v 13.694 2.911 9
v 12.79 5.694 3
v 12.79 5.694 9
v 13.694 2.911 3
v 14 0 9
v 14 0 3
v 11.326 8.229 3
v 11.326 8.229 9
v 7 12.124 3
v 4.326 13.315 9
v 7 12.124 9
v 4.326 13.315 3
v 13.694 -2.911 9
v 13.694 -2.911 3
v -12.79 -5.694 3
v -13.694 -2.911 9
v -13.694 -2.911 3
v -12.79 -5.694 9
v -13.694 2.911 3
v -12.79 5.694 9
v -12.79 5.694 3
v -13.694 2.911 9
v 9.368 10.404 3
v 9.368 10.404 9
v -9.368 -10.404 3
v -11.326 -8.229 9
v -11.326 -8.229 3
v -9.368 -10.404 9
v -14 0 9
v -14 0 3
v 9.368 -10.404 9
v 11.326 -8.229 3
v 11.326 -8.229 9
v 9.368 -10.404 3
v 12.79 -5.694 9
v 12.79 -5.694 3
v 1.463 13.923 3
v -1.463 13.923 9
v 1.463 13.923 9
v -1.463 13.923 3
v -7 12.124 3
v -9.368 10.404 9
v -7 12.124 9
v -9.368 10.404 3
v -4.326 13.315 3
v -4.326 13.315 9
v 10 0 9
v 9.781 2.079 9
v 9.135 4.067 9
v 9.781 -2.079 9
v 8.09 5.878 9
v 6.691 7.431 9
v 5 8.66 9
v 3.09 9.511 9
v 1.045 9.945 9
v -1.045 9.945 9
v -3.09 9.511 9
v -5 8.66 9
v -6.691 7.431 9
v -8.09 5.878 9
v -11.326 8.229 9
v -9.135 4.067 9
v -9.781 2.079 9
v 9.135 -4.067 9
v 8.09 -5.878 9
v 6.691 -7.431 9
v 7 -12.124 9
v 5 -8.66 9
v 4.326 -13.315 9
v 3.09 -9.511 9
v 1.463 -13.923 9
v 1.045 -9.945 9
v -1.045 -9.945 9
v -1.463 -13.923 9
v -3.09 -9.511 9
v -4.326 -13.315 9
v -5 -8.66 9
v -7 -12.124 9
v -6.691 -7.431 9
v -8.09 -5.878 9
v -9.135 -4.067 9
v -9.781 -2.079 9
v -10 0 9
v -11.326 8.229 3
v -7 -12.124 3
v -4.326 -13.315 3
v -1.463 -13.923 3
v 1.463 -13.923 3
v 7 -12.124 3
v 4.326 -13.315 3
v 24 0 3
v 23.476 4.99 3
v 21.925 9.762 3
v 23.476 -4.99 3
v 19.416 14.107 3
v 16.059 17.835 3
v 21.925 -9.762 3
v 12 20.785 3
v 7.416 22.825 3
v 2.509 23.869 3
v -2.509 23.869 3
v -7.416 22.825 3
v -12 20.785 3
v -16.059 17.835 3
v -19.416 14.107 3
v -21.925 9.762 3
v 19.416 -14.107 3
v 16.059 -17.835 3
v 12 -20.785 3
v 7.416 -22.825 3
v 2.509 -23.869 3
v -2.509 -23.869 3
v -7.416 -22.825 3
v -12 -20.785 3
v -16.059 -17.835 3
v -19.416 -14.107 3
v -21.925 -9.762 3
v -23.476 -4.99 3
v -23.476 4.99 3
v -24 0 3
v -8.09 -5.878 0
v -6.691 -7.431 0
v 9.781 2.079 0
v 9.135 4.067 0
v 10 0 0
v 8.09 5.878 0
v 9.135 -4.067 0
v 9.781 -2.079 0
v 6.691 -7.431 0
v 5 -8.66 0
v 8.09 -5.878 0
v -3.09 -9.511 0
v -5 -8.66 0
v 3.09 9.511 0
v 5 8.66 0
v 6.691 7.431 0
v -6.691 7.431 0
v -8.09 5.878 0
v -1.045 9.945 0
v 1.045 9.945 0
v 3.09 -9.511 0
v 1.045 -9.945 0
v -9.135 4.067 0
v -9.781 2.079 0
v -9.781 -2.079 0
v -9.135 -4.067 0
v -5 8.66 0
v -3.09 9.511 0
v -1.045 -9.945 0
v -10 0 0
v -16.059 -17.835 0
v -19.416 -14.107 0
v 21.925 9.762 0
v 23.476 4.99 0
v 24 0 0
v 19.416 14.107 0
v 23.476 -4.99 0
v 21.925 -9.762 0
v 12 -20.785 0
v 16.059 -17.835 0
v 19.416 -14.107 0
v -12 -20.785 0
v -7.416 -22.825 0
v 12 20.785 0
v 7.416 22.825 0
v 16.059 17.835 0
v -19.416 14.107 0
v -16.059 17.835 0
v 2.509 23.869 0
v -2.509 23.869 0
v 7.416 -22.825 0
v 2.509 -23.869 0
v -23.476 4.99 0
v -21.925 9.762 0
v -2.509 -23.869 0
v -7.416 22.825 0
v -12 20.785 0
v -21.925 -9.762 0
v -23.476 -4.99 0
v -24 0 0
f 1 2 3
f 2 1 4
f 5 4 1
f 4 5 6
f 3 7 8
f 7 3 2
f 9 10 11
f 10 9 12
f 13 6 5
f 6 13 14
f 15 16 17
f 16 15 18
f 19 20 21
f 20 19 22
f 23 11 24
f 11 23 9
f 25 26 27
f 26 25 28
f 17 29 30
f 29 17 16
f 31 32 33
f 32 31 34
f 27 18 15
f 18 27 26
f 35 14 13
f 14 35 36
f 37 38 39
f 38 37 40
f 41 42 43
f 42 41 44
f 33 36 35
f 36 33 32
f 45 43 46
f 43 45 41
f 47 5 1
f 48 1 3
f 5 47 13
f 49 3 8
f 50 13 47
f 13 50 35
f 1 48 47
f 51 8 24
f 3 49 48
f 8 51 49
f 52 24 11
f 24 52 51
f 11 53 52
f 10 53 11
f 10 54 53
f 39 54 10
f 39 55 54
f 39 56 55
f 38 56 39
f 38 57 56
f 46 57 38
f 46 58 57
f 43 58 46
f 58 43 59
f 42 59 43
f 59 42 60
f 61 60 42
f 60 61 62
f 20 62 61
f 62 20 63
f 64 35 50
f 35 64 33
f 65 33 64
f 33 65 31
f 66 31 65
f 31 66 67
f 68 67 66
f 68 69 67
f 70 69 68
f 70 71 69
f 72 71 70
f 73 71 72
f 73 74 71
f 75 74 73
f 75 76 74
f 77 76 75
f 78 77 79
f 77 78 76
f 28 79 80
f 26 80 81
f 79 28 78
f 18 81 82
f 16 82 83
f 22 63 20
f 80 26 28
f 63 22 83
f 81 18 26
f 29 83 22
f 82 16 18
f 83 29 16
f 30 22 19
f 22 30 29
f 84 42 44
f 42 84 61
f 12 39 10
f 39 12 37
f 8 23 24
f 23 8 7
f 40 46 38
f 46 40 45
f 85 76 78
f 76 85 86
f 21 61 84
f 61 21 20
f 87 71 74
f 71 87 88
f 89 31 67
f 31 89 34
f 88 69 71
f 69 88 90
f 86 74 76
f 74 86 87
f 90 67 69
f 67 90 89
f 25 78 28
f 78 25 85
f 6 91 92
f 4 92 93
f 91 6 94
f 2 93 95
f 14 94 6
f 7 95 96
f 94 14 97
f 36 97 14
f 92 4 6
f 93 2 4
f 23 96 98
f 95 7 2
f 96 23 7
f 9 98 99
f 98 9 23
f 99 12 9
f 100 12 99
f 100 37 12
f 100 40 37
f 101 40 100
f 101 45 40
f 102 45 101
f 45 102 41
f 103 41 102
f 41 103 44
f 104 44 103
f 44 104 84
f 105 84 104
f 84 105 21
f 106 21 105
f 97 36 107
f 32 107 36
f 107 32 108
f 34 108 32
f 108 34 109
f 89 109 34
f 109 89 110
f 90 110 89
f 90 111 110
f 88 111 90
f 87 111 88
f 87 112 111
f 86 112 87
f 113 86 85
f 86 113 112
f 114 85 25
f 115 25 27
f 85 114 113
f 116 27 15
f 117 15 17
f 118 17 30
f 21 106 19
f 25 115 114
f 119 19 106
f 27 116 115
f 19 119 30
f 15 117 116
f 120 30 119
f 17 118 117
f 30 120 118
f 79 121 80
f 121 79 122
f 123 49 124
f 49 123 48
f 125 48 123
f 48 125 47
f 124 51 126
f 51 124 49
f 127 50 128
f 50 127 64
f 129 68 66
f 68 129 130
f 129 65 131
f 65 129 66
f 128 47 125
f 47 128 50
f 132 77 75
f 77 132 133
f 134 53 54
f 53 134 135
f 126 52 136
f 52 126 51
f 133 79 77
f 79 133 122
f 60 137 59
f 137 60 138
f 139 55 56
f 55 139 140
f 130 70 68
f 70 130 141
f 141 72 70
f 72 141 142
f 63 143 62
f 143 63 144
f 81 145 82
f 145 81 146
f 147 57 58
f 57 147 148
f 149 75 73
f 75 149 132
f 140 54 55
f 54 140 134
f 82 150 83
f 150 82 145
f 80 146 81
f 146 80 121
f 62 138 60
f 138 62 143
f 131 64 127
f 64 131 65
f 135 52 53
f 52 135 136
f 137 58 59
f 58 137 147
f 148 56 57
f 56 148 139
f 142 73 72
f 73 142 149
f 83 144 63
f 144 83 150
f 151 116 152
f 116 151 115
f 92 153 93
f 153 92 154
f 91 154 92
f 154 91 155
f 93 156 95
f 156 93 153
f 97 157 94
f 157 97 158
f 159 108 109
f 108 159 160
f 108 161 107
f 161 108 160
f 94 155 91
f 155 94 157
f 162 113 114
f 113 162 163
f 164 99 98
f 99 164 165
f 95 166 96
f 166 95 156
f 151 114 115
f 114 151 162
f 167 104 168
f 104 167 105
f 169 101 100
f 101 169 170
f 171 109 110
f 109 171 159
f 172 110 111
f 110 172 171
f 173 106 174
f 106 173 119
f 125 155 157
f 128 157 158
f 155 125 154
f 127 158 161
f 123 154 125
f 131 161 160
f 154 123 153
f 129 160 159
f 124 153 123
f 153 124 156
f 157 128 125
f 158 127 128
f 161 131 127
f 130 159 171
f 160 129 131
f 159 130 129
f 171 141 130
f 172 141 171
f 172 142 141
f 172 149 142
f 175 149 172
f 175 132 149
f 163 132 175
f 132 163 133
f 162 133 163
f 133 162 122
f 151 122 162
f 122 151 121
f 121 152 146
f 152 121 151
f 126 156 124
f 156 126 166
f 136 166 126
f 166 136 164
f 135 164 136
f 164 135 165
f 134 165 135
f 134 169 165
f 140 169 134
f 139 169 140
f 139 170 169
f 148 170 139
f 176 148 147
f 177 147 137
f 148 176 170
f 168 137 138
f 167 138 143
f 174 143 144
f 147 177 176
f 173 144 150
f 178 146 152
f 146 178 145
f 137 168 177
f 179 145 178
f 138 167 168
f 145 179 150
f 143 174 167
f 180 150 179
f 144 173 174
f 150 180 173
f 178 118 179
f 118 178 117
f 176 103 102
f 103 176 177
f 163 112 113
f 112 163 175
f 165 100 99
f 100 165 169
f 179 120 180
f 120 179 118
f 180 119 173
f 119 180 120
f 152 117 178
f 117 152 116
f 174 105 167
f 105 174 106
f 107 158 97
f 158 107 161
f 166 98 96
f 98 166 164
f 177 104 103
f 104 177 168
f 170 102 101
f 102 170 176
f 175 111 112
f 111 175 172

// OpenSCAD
translate([0,0,3]) {
    // Your ring code here
    difference() {
        cylinder(h=6, d=28);
        cylinder(h=6, d=20);
    }
}




translate([0,0,0]) {
    // Your ring code here
    difference() {
        cylinder(h=3, d=48);
        cylinder(h=3, d=20);
    }
}
